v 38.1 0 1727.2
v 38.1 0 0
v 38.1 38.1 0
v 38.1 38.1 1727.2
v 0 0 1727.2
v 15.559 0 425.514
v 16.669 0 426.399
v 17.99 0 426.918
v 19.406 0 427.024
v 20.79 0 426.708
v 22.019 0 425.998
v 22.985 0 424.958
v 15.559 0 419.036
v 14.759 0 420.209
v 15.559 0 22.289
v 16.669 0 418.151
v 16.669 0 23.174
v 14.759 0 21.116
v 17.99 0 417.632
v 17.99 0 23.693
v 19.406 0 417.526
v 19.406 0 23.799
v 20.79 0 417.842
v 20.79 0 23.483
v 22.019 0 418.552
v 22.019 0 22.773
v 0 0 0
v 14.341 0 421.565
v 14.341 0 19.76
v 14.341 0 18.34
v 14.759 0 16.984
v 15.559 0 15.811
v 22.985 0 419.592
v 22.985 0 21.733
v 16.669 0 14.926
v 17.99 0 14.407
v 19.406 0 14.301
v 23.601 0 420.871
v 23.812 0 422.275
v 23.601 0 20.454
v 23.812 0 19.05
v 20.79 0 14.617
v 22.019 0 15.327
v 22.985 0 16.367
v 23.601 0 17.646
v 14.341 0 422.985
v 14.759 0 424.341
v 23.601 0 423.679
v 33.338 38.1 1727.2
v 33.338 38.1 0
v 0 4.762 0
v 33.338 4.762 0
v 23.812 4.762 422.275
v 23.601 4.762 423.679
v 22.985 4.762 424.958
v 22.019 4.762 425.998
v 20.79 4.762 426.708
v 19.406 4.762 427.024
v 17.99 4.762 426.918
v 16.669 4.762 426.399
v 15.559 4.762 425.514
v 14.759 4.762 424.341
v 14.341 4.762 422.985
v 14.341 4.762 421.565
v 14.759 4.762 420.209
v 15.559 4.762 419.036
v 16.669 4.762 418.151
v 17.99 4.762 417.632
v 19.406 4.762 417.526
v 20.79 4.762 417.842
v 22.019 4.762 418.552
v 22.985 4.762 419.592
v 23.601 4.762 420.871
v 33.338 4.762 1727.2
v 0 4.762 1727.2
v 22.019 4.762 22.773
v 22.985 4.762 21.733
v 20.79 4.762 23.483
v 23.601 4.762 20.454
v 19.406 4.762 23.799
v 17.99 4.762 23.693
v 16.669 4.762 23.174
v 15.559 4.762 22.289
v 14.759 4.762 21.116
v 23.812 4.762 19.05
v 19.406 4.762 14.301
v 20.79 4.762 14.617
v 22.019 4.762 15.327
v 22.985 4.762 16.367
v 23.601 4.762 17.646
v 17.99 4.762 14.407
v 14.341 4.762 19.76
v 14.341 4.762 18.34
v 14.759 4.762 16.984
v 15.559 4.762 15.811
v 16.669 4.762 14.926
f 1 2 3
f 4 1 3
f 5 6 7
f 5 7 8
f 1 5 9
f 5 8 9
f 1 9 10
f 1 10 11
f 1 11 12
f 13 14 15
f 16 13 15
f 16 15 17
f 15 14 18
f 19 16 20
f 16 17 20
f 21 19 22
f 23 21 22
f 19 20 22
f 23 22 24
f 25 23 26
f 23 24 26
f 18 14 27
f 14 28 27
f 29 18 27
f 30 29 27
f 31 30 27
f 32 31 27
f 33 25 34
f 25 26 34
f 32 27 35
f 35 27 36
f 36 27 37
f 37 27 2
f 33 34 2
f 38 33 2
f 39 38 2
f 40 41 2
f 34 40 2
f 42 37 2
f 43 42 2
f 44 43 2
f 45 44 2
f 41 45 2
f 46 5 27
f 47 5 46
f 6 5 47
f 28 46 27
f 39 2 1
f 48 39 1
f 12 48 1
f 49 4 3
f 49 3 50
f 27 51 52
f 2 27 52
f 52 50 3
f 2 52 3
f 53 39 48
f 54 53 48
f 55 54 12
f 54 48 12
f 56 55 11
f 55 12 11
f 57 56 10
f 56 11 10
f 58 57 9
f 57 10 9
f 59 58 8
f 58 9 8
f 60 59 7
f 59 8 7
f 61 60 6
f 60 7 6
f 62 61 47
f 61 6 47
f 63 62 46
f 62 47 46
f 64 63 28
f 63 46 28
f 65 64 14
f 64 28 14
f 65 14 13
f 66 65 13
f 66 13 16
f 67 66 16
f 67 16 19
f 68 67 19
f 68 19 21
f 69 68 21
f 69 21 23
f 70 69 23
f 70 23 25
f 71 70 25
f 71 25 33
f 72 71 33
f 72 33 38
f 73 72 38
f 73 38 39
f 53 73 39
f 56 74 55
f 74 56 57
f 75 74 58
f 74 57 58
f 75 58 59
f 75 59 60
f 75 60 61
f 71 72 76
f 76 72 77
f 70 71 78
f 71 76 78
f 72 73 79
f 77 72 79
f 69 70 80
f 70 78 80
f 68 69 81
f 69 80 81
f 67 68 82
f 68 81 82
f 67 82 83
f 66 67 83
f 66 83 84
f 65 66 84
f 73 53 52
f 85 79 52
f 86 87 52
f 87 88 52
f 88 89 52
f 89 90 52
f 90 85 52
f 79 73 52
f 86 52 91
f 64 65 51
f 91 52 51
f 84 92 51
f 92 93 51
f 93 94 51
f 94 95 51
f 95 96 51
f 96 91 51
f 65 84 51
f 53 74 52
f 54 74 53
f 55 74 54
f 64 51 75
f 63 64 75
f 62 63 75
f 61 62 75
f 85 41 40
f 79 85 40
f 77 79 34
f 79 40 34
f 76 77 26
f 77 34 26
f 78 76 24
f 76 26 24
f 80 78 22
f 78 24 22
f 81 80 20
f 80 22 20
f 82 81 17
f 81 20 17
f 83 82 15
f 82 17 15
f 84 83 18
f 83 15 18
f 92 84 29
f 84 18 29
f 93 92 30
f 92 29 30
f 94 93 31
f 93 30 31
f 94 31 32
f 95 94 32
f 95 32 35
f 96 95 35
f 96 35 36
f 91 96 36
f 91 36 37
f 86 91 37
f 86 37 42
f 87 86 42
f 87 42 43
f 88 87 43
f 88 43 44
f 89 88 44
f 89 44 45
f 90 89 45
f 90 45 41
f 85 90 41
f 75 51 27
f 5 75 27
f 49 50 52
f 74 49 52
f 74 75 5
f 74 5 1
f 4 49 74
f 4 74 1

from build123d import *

# Parameters (mm, degrees)
F1_DEPTH = 1727.2
F2_R     = 4.7625
F3_DEPTH = 38.101
F4_R     = 4.7625
F5_DEPTH = 38.101


with BuildPart() as f1:
    # F0 (on Top) → F1 (new body)
    with BuildSketch(Plane.XY):
        Polygon((0, 4.7625), (0, 0), (38.1, 0), (38.1, 38.1), (33.3375, 38.1), (33.3375, 4.7625), align=None)
    extrude(amount=F1_DEPTH)

    # F2 (on face) → F3 (cut, through all)
    with BuildSketch(Plane.XZ):
        with Locations((19.05, 19.05)):
            Circle(F2_R)
    extrude(amount=-F3_DEPTH, mode=Mode.SUBTRACT)

    # F4 (on face) → F5 (cut, through all)
    with BuildSketch(Plane.XZ):
        with Locations((19.05, 422.275)):
            Circle(F4_R)
    extrude(amount=-F5_DEPTH, mode=Mode.SUBTRACT)


solid = f1.part
